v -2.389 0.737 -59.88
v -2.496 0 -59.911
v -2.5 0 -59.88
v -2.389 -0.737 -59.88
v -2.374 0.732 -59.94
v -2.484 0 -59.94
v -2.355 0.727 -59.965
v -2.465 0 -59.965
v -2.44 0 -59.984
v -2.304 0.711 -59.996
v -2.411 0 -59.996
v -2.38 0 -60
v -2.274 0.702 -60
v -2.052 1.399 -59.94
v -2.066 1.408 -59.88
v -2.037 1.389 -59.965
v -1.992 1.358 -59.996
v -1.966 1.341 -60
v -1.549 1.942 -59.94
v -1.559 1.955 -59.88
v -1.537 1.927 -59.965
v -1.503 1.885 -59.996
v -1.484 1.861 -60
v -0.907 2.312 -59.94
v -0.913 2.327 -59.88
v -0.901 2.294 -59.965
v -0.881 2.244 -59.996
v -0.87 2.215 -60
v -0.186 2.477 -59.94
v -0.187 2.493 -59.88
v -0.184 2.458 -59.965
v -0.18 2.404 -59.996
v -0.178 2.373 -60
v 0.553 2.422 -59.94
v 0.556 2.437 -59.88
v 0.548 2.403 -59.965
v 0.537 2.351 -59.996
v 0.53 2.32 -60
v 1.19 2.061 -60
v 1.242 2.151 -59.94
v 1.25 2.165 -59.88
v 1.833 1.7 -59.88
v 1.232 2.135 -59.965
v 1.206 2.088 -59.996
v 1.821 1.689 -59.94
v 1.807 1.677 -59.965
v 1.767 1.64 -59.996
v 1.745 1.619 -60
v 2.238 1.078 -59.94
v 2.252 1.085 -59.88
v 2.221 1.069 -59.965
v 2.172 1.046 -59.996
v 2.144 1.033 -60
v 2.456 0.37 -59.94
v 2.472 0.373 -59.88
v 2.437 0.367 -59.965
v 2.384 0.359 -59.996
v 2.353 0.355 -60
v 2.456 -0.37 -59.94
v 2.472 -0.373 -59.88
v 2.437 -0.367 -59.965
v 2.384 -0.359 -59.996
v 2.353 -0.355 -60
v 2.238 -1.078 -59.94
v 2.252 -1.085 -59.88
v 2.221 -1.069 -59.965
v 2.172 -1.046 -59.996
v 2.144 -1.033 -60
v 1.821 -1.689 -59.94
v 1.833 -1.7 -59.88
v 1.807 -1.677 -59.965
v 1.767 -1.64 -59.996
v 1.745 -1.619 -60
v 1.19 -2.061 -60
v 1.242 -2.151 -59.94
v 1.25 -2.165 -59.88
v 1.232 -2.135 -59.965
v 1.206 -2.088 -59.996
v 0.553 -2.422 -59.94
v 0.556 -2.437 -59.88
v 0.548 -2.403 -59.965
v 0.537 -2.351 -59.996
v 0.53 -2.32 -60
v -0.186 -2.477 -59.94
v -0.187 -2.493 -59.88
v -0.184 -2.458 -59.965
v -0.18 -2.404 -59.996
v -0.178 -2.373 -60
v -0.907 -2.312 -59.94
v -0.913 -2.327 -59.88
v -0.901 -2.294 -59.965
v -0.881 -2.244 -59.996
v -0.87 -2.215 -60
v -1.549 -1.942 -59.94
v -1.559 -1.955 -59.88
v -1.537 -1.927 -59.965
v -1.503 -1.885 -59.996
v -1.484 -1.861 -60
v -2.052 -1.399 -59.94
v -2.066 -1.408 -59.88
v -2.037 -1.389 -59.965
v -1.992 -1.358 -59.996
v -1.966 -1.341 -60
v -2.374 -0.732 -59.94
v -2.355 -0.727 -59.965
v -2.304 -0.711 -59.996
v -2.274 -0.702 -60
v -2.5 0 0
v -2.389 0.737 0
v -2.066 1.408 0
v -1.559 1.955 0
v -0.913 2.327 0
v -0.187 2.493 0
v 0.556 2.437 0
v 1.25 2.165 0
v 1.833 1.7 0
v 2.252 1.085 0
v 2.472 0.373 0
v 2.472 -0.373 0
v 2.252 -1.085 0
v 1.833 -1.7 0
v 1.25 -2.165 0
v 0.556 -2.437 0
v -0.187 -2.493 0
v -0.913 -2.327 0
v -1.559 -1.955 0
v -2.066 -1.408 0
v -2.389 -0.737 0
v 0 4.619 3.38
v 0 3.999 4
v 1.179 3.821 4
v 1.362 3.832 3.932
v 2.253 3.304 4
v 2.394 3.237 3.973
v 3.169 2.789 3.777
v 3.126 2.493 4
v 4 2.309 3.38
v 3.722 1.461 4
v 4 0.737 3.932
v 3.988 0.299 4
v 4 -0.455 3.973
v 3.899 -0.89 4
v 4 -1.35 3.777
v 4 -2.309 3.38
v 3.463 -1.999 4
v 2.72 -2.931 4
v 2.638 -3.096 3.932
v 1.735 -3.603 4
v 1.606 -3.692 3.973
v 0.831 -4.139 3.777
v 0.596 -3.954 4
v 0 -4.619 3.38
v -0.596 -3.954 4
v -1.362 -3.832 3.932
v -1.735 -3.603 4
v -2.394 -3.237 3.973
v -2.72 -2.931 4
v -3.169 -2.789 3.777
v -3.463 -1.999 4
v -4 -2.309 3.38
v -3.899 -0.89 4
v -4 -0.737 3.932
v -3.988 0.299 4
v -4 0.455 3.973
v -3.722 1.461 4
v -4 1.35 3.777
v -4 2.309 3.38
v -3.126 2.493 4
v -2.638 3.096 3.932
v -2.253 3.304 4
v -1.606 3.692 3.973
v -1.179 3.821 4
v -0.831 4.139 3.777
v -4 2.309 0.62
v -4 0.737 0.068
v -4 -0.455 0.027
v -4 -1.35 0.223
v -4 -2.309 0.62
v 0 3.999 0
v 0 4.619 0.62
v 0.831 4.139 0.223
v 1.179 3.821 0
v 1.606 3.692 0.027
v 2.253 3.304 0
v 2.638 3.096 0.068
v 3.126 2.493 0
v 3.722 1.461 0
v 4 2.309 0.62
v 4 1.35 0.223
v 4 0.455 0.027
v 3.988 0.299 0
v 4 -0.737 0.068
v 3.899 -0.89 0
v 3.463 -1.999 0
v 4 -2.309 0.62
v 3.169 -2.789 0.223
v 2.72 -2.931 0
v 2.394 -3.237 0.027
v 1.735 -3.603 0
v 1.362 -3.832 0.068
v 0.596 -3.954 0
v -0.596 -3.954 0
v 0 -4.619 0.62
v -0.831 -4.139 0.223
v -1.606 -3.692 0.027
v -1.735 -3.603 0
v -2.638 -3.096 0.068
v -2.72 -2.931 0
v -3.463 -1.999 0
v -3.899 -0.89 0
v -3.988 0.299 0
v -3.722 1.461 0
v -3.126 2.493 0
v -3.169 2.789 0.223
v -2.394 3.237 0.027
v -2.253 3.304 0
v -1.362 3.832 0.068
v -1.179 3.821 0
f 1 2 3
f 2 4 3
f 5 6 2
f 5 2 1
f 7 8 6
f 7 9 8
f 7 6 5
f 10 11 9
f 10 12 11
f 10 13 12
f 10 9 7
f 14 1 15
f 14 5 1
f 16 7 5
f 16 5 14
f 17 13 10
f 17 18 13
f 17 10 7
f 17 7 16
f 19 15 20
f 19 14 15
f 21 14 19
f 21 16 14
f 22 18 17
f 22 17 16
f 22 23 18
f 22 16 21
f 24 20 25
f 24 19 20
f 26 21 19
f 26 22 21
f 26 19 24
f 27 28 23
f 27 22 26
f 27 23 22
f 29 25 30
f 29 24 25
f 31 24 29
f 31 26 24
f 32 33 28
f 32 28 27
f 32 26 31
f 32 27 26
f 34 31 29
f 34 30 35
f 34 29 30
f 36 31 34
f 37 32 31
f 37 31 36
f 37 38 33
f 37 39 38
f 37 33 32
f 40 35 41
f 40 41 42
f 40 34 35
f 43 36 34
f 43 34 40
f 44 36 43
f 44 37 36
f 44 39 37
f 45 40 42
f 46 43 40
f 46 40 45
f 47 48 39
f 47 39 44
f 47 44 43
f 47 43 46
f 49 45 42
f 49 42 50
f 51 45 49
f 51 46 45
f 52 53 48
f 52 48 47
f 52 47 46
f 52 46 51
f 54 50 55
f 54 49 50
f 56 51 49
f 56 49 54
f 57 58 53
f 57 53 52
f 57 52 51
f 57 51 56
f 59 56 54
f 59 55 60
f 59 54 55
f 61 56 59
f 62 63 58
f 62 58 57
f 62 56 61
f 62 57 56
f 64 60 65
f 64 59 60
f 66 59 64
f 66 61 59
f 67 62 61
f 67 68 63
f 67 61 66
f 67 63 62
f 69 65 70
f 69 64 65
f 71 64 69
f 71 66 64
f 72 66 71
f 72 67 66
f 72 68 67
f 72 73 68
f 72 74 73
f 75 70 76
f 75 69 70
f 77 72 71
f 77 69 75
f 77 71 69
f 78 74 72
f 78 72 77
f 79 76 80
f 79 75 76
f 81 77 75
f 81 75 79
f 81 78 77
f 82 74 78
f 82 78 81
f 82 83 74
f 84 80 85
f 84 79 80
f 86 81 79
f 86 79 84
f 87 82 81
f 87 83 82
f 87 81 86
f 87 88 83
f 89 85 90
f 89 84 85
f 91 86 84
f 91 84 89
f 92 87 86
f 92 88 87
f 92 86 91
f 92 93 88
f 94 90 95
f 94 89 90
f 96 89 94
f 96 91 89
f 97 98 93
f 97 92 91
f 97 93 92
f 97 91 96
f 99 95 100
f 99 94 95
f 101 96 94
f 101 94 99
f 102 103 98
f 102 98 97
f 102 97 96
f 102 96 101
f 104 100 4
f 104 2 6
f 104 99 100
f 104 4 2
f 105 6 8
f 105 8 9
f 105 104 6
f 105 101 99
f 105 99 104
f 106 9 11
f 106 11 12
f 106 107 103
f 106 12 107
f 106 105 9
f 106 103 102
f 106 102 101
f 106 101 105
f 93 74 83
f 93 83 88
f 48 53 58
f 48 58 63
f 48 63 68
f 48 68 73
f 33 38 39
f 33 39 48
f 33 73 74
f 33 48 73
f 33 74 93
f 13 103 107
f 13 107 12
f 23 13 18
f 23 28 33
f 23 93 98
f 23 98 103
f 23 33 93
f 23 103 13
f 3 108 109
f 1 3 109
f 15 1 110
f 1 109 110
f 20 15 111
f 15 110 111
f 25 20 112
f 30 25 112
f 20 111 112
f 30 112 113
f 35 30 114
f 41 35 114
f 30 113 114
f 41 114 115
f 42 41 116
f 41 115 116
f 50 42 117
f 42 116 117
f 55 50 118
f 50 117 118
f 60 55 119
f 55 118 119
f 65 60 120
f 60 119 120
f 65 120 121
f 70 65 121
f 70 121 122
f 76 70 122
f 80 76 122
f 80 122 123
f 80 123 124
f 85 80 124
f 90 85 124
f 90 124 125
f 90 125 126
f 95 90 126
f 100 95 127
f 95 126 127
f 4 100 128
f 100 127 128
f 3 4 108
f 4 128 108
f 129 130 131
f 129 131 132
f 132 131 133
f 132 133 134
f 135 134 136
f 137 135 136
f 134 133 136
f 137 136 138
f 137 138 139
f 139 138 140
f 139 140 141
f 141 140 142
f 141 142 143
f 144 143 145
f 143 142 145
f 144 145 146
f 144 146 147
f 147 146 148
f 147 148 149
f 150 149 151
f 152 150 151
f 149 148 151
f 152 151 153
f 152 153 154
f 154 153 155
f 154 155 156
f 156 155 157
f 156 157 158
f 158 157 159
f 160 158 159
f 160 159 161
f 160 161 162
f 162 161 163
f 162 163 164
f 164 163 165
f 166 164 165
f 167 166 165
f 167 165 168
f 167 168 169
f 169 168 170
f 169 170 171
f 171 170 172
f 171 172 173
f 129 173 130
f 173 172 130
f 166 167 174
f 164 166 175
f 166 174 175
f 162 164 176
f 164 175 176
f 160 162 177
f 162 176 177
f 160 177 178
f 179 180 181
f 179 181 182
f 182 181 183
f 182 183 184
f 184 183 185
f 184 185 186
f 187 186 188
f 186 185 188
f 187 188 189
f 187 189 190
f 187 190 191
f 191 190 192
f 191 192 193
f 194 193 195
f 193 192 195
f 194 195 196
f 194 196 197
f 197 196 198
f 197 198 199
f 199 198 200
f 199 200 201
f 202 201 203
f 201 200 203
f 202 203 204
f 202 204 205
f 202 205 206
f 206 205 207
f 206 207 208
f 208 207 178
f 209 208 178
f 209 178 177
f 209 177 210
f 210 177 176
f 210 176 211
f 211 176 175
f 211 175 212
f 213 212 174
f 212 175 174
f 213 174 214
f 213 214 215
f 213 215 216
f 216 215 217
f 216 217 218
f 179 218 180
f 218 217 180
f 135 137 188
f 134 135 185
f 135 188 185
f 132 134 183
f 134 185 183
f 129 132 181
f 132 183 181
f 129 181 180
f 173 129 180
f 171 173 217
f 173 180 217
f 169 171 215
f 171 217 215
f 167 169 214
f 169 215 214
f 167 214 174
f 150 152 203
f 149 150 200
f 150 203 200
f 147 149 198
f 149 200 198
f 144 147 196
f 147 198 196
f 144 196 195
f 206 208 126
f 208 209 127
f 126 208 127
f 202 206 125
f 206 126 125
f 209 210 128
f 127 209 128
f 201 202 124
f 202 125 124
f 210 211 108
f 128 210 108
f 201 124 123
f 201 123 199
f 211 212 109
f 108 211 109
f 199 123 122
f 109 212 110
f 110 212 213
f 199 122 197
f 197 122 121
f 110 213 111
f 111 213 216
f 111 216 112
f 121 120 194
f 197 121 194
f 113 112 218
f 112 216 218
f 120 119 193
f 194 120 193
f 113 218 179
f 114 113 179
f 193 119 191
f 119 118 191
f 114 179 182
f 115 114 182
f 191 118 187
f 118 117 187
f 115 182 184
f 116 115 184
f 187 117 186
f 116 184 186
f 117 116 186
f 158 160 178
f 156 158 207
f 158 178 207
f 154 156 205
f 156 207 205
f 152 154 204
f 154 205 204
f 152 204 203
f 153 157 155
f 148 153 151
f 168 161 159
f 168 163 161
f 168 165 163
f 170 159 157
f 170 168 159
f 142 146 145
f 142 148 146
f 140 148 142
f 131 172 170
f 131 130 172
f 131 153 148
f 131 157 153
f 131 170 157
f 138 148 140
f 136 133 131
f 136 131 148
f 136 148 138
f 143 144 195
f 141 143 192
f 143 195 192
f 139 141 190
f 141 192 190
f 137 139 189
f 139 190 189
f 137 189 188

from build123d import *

# Parameters (mm, degrees)
EXTRUDE_1_DEPTH = 4
SKETCH_3_R      = 2.5
EXTRUDE_2_DEPTH = 60
FILLET_2_R      = 0.12


with BuildPart() as part:
    # 草图1 → 凸台-拉伸1 (new body)
    with BuildSketch(Plane.XY):
        Polygon((0, 4.618802154), (-4, 2.309401077), (-4, -2.309401077), (0, -4.618802154), (4, -2.309401077), (4, 2.309401077), align=None)
    extrude(amount=EXTRUDE_1_DEPTH)

    # 草图2 → 切除-旋转1 (revolve, cut)
    with BuildSketch(Plane(origin=(0, 0, 0), x_dir=(0, 0, -1), z_dir=(1, 0, 0))):
        Polygon((0, 4.618802154), (0, 3.998802154), (-0.62, 4.618802154), align=None)
        Polygon((-3.38, 4.618802154), (-4, 3.998802154), (-4, 4.618802154), align=None)
    revolve(axis=Axis((0, 0, 0), (0, 0, -1)), mode=Mode.SUBTRACT)

    # 草图3 → 凸台-拉伸2 (add)
    with BuildSketch(Plane(origin=(0, 0, 0), x_dir=(-1, 0, 0), z_dir=(0, 0, -1))):
        Circle(SKETCH_3_R)
    extrude(amount=EXTRUDE_2_DEPTH)

    # 圆角2
    fillet_2_edges = [part.edges().sort_by_distance(p)[0] for p in [
        (2.5, 0, -60),
    ]]
    fillet(fillet_2_edges, radius=FILLET_2_R)


solid = part.part
